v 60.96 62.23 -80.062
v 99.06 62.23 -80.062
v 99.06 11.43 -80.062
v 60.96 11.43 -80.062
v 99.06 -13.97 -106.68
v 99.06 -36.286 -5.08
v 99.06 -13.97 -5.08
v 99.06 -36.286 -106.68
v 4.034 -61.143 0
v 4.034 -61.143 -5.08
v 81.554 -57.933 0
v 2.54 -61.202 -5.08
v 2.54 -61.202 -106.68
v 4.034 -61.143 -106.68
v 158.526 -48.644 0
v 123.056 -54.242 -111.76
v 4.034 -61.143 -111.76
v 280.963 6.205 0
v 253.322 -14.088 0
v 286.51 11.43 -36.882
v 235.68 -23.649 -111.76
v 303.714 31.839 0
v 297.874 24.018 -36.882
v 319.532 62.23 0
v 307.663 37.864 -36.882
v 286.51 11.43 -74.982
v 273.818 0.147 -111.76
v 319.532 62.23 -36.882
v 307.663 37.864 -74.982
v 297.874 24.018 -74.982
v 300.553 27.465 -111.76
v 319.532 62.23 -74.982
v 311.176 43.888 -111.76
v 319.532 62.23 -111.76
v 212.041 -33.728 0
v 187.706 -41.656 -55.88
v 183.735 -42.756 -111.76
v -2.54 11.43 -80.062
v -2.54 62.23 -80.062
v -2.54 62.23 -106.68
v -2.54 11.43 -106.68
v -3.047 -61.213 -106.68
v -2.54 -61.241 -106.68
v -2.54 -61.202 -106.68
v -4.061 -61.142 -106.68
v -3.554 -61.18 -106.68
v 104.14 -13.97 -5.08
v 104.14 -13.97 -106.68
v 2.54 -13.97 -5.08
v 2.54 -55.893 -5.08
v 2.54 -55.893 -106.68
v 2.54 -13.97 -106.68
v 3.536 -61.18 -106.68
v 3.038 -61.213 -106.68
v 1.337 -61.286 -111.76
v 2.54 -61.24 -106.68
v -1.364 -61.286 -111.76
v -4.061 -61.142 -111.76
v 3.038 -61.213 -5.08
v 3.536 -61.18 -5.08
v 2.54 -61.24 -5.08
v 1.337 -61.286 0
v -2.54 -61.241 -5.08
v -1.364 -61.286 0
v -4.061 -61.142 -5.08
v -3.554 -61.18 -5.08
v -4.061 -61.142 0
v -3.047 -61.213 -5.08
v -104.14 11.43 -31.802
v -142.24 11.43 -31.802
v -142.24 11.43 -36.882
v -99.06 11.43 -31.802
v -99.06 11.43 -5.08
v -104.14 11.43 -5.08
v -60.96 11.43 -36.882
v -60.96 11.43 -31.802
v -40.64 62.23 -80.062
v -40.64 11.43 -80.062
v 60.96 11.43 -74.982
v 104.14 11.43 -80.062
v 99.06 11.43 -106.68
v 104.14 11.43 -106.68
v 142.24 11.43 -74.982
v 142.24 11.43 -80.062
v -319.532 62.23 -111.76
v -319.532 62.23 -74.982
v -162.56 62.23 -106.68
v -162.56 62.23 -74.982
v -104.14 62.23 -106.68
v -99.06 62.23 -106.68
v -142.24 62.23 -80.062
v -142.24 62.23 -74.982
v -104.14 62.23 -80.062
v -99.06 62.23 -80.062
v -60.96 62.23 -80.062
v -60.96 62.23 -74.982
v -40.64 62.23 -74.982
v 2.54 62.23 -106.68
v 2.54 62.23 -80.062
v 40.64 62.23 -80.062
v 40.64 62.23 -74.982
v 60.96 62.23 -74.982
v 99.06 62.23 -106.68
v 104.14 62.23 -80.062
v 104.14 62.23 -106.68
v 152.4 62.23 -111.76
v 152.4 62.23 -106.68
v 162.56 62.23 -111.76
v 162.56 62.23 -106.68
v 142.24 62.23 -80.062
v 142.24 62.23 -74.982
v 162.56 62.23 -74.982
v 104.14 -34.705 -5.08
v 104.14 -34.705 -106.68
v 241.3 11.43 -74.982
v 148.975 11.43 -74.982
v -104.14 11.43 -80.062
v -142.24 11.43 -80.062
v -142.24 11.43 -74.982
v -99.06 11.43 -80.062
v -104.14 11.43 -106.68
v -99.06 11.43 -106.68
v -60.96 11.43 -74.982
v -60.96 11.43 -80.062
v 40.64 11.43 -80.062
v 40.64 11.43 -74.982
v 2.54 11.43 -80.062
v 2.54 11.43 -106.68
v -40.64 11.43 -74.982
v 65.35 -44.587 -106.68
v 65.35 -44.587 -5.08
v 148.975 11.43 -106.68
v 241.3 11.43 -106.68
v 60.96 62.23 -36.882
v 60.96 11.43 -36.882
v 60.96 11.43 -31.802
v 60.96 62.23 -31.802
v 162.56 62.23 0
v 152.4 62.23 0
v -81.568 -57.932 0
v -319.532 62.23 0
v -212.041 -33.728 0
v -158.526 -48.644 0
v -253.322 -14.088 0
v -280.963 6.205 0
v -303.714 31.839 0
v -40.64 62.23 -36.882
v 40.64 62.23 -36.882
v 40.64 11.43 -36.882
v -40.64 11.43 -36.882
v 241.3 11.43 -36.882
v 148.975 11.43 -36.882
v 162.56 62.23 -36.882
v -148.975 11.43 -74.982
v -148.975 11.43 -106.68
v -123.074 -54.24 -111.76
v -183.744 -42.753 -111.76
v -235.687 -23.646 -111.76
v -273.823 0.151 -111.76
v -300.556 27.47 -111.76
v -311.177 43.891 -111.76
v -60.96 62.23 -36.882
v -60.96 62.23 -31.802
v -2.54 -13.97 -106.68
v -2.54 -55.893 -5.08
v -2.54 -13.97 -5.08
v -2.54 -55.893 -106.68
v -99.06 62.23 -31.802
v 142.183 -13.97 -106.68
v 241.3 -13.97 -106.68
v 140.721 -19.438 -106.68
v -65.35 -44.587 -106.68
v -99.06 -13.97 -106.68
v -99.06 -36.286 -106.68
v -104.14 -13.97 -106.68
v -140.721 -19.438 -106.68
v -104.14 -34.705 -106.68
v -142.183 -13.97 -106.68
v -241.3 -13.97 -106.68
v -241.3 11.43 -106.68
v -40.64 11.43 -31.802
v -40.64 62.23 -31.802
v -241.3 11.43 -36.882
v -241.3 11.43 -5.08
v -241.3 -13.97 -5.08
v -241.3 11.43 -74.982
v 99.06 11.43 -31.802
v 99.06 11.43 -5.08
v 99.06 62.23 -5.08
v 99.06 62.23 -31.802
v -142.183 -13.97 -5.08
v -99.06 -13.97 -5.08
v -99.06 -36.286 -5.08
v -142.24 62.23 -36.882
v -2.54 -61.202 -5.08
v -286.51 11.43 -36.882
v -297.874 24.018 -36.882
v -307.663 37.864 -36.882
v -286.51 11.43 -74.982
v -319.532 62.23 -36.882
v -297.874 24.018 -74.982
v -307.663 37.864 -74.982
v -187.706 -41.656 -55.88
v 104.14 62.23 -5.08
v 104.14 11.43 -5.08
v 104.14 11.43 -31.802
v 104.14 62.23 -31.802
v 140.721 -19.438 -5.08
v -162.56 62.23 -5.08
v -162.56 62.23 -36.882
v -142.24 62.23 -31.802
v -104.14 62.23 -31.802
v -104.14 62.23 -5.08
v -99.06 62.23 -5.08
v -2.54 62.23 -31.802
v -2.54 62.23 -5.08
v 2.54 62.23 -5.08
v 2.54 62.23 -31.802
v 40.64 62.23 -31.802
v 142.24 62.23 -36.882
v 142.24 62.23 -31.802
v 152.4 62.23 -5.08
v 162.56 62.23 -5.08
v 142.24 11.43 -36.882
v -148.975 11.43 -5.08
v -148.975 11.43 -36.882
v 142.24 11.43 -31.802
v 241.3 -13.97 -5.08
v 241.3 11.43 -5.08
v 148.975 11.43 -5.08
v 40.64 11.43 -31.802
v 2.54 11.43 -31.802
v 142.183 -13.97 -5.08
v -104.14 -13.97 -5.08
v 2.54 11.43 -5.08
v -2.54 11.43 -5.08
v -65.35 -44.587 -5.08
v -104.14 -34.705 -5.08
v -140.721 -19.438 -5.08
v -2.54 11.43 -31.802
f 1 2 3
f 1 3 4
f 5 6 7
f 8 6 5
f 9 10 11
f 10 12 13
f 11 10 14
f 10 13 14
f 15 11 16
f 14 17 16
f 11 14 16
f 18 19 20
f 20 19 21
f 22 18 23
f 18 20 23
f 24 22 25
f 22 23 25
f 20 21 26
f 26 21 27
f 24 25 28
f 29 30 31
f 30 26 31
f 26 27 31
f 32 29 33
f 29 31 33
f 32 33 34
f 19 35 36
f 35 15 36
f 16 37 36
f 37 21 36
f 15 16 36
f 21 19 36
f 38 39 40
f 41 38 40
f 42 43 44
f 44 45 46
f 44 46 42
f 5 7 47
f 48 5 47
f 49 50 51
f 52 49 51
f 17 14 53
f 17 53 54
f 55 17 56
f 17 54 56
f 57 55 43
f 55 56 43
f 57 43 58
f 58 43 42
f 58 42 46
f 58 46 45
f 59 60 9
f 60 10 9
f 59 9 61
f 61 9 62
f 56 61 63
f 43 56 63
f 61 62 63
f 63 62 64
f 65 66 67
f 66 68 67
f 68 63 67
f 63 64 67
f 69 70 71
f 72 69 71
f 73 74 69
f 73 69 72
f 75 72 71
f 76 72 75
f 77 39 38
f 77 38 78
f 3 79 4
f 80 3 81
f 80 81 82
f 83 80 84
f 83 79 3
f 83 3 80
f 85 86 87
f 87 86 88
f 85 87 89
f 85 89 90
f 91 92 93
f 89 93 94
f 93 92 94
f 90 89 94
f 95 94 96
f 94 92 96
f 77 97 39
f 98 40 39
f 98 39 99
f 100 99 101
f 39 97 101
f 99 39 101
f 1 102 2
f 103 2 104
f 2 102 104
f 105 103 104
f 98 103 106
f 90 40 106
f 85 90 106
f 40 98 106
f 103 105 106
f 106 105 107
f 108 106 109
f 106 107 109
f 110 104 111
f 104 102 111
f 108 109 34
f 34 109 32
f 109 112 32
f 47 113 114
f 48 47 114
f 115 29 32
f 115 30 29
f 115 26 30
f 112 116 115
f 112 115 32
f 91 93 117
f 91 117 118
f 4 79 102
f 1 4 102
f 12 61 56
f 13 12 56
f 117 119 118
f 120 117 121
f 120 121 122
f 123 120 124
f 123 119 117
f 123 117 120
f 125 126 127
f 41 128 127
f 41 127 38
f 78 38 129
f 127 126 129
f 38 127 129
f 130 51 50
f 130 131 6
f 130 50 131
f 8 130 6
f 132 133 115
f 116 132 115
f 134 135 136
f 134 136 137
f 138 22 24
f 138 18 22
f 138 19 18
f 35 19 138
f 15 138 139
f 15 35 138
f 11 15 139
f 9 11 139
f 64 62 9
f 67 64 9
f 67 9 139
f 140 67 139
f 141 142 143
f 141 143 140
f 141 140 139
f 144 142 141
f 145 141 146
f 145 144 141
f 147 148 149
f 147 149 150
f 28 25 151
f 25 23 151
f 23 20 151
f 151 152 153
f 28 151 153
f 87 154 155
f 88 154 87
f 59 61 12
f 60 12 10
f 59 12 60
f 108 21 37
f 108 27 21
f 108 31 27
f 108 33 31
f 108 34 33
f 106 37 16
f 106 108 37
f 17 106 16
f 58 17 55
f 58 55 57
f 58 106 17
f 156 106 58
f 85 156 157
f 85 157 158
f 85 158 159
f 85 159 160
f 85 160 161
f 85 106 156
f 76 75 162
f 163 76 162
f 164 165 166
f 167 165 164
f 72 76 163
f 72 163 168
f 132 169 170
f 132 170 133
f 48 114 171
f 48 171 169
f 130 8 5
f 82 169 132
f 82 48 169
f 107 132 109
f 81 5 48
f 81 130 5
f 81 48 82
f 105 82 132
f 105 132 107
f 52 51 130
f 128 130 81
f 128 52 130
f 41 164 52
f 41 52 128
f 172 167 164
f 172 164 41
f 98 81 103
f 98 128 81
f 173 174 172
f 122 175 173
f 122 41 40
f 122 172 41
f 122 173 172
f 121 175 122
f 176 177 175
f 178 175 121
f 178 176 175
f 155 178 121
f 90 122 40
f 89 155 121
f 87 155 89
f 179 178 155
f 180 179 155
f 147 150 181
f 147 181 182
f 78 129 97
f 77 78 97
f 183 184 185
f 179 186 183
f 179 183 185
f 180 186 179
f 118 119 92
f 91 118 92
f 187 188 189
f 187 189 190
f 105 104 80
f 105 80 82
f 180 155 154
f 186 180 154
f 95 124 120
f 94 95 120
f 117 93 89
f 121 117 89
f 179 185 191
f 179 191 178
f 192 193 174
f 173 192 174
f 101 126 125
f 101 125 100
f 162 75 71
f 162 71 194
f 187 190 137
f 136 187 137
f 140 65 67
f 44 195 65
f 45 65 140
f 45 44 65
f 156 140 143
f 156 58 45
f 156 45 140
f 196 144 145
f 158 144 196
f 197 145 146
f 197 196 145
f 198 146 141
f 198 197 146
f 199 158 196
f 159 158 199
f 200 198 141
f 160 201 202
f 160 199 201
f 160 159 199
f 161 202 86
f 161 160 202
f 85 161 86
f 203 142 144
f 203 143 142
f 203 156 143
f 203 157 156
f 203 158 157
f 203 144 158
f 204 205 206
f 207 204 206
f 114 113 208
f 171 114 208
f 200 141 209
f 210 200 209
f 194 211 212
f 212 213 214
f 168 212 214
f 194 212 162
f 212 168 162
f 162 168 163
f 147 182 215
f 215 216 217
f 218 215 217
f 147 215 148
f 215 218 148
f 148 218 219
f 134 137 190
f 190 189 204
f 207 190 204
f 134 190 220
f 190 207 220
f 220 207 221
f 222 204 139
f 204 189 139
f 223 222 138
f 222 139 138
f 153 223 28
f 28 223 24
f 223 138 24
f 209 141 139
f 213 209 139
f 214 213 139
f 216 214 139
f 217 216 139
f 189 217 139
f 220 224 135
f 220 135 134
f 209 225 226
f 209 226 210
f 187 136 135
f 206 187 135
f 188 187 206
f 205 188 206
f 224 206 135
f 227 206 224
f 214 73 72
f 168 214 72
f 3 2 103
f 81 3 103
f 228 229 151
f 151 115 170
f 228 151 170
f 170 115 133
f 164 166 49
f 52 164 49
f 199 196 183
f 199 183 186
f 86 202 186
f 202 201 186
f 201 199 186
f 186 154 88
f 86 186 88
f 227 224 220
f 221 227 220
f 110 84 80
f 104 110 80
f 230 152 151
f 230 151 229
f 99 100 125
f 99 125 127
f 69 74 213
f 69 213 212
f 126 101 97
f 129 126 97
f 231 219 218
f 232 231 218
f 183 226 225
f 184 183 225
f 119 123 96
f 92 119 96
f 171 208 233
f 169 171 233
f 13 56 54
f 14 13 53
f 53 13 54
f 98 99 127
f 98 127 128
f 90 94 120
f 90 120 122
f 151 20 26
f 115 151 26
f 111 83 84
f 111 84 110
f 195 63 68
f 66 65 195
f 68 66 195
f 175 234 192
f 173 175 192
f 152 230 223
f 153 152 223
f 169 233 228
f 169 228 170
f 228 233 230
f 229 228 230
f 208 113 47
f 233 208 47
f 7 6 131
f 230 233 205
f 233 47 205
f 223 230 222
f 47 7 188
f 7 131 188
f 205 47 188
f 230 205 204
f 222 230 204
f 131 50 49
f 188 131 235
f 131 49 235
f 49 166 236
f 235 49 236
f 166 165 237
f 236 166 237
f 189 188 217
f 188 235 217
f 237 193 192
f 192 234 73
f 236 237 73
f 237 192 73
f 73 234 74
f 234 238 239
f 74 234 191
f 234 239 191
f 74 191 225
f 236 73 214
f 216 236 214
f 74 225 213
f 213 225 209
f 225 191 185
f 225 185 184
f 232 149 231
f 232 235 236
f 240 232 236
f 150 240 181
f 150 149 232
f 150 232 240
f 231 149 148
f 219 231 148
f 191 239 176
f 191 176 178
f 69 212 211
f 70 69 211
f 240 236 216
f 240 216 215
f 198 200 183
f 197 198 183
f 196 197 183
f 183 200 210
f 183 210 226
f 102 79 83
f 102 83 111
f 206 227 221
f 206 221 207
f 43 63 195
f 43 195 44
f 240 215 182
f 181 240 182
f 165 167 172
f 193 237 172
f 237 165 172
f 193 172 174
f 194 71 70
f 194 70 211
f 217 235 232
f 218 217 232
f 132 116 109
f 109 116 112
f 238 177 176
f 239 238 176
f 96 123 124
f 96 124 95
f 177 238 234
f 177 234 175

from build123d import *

# Parameters (mm, degrees)
BOSS_EXTRUDE1_DEPTH                 = 111.76
SKETCH5_W                           = 304.8
SKETCH5_H                           = 25.4
CUT_EXTRUDE3_DEPTH                  = 101.6
CUT_EXTRUDE4_DEPTH                  = 227.288199427
CUT_EXTRUDE4_DEPTH_BACK             = 227.288199427
SKETCH3_W                           = 96.52
SKETCH3_H                           = 101.6
SKETCH3_W_2                         = 48.26
CUT_EXTRUDE5_REACH                  = 288.663
SKETCH6_W                           = 38.1
SKETCH6_H                           = 50.8
SKETCH7_W                           = 81.28
SKETCH7_H                           = 50.8
BOSS_EXTRUDE2_DEPTH                 = 5.08
SKETCH9_W                           = 5.08
SKETCH9_H                           = 95.25
BOSS_EXTRUDE3_DEPTH                 = 10.16
SKETCH10_W                          = 5.08
SKETCH10_H                          = 95.206439839
BOSS_EXTRUDE4_DEPTH                 = 10.16
CUT_EXTRUDE7_REACH                  = 208.854
FILLET1_R                           = 50.8
BOSS_EXTRUDE5_REACH                 = 208.854
CUT_EXTRUDE8_REACH                  = 248.593
CUT_EXTRUDE8_END_RADIUS             = 126.32098656
CUT_EXTRUDE8_DIRECTION_2_REACH      = 248.593
CUT_EXTRUDE8_DIRECTION_2_END_RADIUS = 126.32098656
BOSS_EXTRUDE6_REACH                 = 248.593
CUT_EXTRUDE9_DEPTH                  = 241.3
CUT_EXTRUDE9_DEPTH_BACK             = 241.3
CUT_EXTRUDE10_REACH                 = 346.185
SKETCH16_W                          = 38.1
SKETCH16_H                          = 50.8
CUT_EXTRUDE10_DIRECTION_2_REACH     = 346.185


with BuildPart() as part:
    # Sketch1 → Boss-Extrude1 (new body)
    with BuildSketch(Plane.XY):
        Polygon((-152.4, 62.23), (-152.4, -33.02), (0, -62.23), (152.4, -32.976439839), (152.4, 62.23), align=None)
    extrude(amount=-BOSS_EXTRUDE1_DEPTH)

    # Sketch5 → Cut-Extrude3 (cut)
    with BuildSketch(Plane.XY.offset(-5.08)):
        with Locations((0, -1.27)):
            Rectangle(SKETCH5_W, SKETCH5_H)
    extrude(amount=-CUT_EXTRUDE3_DEPTH, mode=Mode.SUBTRACT)

    # Sketch3 → Cut-Extrude4 (cut, two sides: drawn at the far end of the back side and taken through both)
    with BuildSketch(Plane(origin=(0, 62.23, 0), x_dir=(1, 0, 0), z_dir=(0, 1, 0)).offset(-CUT_EXTRUDE4_DEPTH_BACK)):
        with Locations((-50.8, 55.88)):
            Rectangle(SKETCH3_W, SKETCH3_H)
        with Locations((50.8, 55.88)):
            Rectangle(SKETCH3_W, SKETCH3_H)
        with Locations((-128.27, 55.88)):
            Rectangle(SKETCH3_W_2, SKETCH3_H)
        with Locations((128.27, 55.88)):
            Rectangle(SKETCH3_W_2, SKETCH3_H)
    extrude(amount=CUT_EXTRUDE4_DEPTH + CUT_EXTRUDE4_DEPTH_BACK, mode=Mode.SUBTRACT)

    # Cut-Extrude5: up to this face of the body (flat: up to its plane)
    cut_extrude5_end = Plane(part.part.faces().sort_by_distance((104.14, 36.83, -55.88))[0])
    # Sketch6 → Cut-Extrude5 (cut, up to the picked face)
    with BuildSketch(Plane.ZY.offset(104.14), mode=Mode.PRIVATE) as cut_extrude5_sk1:
        with Locations((-55.932057734, 36.83)):
            Rectangle(SKETCH6_W, SKETCH6_H)
    cut_extrude5_tool1 = split(extrude(cut_extrude5_sk1.sketch, amount=-CUT_EXTRUDE5_REACH, mode=Mode.PRIVATE), bisect_by=cut_extrude5_end, keep=Keep.BOTH, mode=Mode.PRIVATE)
    add(cut_extrude5_tool1.solids().sort_by(Axis((-104.14, 36.83, -55.932058), (1, 0, 0)))[0], mode=Mode.SUBTRACT)

    # Sketch7 → Boss-Extrude2 (add)
    with BuildSketch(Plane(origin=(0, 0, -36.882057734), x_dir=(-1, 0, 0), z_dir=(0, 0, -1))):
        with Locations((0, 36.83)):
            Rectangle(SKETCH7_W, SKETCH7_H)
        with Locations((101.6, 36.83)):
            Rectangle(SKETCH7_W, SKETCH7_H)
        with Locations((-101.6, 36.83)):
            Rectangle(SKETCH7_W, SKETCH7_H)
    boss_extrude2 = extrude(amount=-BOSS_EXTRUDE2_DEPTH)

    # Mirror1: Boss-Extrude2 across plane
    add(boss_extrude2.mirror(Plane(origin=(0, 0, -55.932057734), x_dir=(1, 0, 0), z_dir=(0, 0, -1))))

    # Sketch9 → Boss-Extrude3 (add)
    with BuildSketch(Plane.ZY.offset(152.4)):
        with Locations((-109.22, 14.605)):
            Rectangle(SKETCH9_W, SKETCH9_H)
        with Locations((-2.54, 14.605)):
            Rectangle(SKETCH9_W, SKETCH9_H)
    extrude(amount=BOSS_EXTRUDE3_DEPTH)

    # Sketch10 → Boss-Extrude4 (add)
    with BuildSketch(Plane(origin=(152.4, 0, 0), x_dir=(0, 0, -1), z_dir=(1, 0, 0))):
        with Locations((2.54, 14.626780081)):
            Rectangle(SKETCH10_W, SKETCH10_H)
        with Locations((109.22, 14.626780081)):
            Rectangle(SKETCH10_W, SKETCH10_H)
    extrude(amount=BOSS_EXTRUDE4_DEPTH)

    # Cut-Extrude7: up to this face of the body (flat: up to its plane)
    cut_extrude7_end = Plane(part.part.faces().sort_by_distance((-0.011490312, 7.400814094, -111.76))[0])
    # Sketch11 → Cut-Extrude7 (cut, up to the picked face)
    with BuildSketch(Plane.XY, mode=Mode.PRIVATE) as cut_extrude7_sk1:
        Polygon((-162.56, -12.7), (-119.696308585, -39.288207521), (-152.4, -33.02), (-162.56, -33.02), align=None)
    cut_extrude7_tool1 = split(extrude(cut_extrude7_sk1.sketch, amount=-CUT_EXTRUDE7_REACH, mode=Mode.PRIVATE), bisect_by=cut_extrude7_end, keep=Keep.BOTH, mode=Mode.PRIVATE)
    # Sketch11 → Cut-Extrude7 (cut, up to the picked face)
    with BuildSketch(Plane.XY, mode=Mode.PRIVATE) as cut_extrude7_sk2:
        Polygon((152.4, -33.02), (162.56, -33.02), (162.56, -12.7), (119.696308585, -39.288207521), align=None)
    cut_extrude7_tool2 = split(extrude(cut_extrude7_sk2.sketch, amount=-CUT_EXTRUDE7_REACH, mode=Mode.PRIVATE), bisect_by=cut_extrude7_end, keep=Keep.BOTH, mode=Mode.PRIVATE)
    add(cut_extrude7_tool1.solids().sort_by(Axis((-148.539263, -27.801749, 0), (0, 0, -1)))[0], mode=Mode.SUBTRACT)
    add(cut_extrude7_tool2.solids().sort_by(Axis((148.539263, -27.801749, 0), (0, 0, -1)))[0], mode=Mode.SUBTRACT)

    # Fillet1
    # the kernel refuses this fillet: 50.8 mm, written as the material it takes off along each edge
    with BuildSketch(Plane(origin=(-162.56, -12.7, 70.671047804), x_dir=(0.8497897447130388, -0.5271217978613181, 0), z_dir=(0, 0, -1)), Plane(origin=(-162.56, -12.7, -36.008952196), x_dir=(0.8497897447130388, -0.5271217978613181, 0), z_dir=(0, 0, -1)), Plane(origin=(162.56, -12.7, 70.671047804), x_dir=(0, 1, 0), z_dir=(0, 0, -1))) as fillet1_piece_1:
        with BuildLine():
            CenterArc((FILLET1_R * 0.556464943335, -FILLET1_R), FILLET1_R, 90, 58.188808221)
            Line((-FILLET1_R * 0.293324801378, -FILLET1_R * 0.472878202139), (0, 0))
            Line((0, 0), (FILLET1_R * 0.556464943335, 0))
        make_face()
    extrude(amount=146.422095607, mode=Mode.SUBTRACT)
    with BuildSketch(Plane(origin=(-119.696308585, -39.288207521, -83.186546401), x_dir=(0.9821230119270369, -0.18824024395268216, 0), z_dir=(0, 0, -1)), Plane(origin=(-119.696308585, -39.288207521, 23.493453599), x_dir=(0.9821230119270369, -0.18824024395268216, 0), z_dir=(0, 0, -1))) as fillet1_piece_2:
        with BuildLine():
            CenterArc((FILLET1_R * 0.184987823618, -FILLET1_R), FILLET1_R, 90, 20.961087149)
            Line((-FILLET1_R * 0.172745995297, -FILLET1_R * 0.0661764005955), (0, 0))
            Line((0, 0), (FILLET1_R * 0.184987823618, 0))
        make_face()
    extrude(amount=52.066907199, mode=Mode.SUBTRACT)
    with BuildSketch(Plane(origin=(162.56, -12.7, -36.008952196), x_dir=(-0.8497897447130388, -0.5271217978613181, 0), z_dir=(0, 0, -1))) as fillet1_piece_3:
        with BuildLine():
            CenterArc((FILLET1_R * 0.556464943335, FILLET1_R), FILLET1_R, 211.811191779, 58.188808221)
            Line((-FILLET1_R * 0.293324801378, FILLET1_R * 0.472878202139), (0, 0))
            Line((0, 0), (FILLET1_R * 0.556464943335, 0))
        make_face()
    extrude(amount=146.422095607, mode=Mode.SUBTRACT)
    with BuildSketch(Plane(origin=(119.776180176, -39.238663434, -83.204651008), x_dir=(-0.9820710795721669, -0.18851099349363817, 0), z_dir=(0, 0, -1)), Plane(origin=(119.776180176, -39.238663434, 23.475348992), x_dir=(-0.9820710795721669, -0.18851099349363817, 0), z_dir=(0, 0, -1))) as fillet1_piece_4:
        with BuildLine():
            CenterArc((FILLET1_R * 0.184845267653, FILLET1_R), FILLET1_R, 249.054708445, 20.945291555)
            Line((-FILLET1_R * 0.172631096402, FILLET1_R * 0.0660778141933), (0, 0))
            Line((0, 0), (FILLET1_R * 0.184845267653, 0))
        make_face()
    extrude(amount=52.030697984, mode=Mode.SUBTRACT)
    with BuildSketch(Plane(origin=(0, -62.23, 24.359816254), x_dir=(-0.982123011927037, 0.1882402439526816, 0), z_dir=(0, 0, -1))) as fillet1_piece_5:
        with BuildLine():
            CenterArc((FILLET1_R * 0.191809576801, FILLET1_R), FILLET1_R, 248.283995147, 21.716004853)
            Line((-FILLET1_R * 0.178196707507, FILLET1_R * 0.0709707488072), (0, 0))
            Line((0, 0), (FILLET1_R * 0.191809576801, 0))
        make_face()
    extrude(amount=160.479632508, mode=Mode.SUBTRACT)

    # Boss-Extrude5: up to this face of the body (flat: up to its plane)
    boss_extrude5_end = Plane(part.part.faces().sort_by_distance((-0.004732582, 8.379000895, -111.76))[0])
    # Sketch12 → Boss-Extrude5 (add, up to the picked face)
    with BuildSketch(Plane.XY, mode=Mode.PRIVATE) as boss_extrude5_sk1:
        with BuildLine():
            Line((-162.56, 62.23), (-210.82, 62.23))
            ThreePointArc((-210.82, 62.23), (-185.525923559, 8.586514121), (-138.537787331, -27.60089991))
            Line((-138.537787331, -27.60089991), (-162.56, 62.23))
        make_face()
    boss_extrude5_tool1 = split(extrude(boss_extrude5_sk1.sketch, amount=-BOSS_EXTRUDE5_REACH, mode=Mode.PRIVATE), bisect_by=boss_extrude5_end, keep=Keep.BOTH, mode=Mode.PRIVATE)
    # Sketch12 → Boss-Extrude5 (add, up to the picked face)
    with BuildSketch(Plane.XY, mode=Mode.PRIVATE) as boss_extrude5_sk2:
        with BuildLine():
            Line((162.56, 62.23), (210.82, 62.23))
            ThreePointArc((210.82, 62.23), (185.525923559, 8.586514121), (138.537787331, -27.60089991))
            Line((138.537787331, -27.60089991), (162.56, 62.23))
        make_face()
    boss_extrude5_tool2 = split(extrude(boss_extrude5_sk2.sketch, amount=-BOSS_EXTRUDE5_REACH, mode=Mode.PRIVATE), bisect_by=boss_extrude5_end, keep=Keep.BOTH, mode=Mode.PRIVATE)
    add(boss_extrude5_tool1.solids().sort_by(Axis((-173.436994, 26.131053, 0), (0, 0, -1)))[0])
    add(boss_extrude5_tool2.solids().sort_by(Axis((173.436994, 26.131053, 0), (0, 0, -1)))[0])

    # Cut-Extrude8: up to this cylinder (the profile starts inside it)
    cut_extrude8_end = Plane(origin=(-87.109319049, 87.777192878, -55.90231), z_dir=(0, 0, 1)) * Cylinder(CUT_EXTRUDE8_END_RADIUS, 750.827973119, mode=Mode.PRIVATE)
    # Sketch13 → Cut-Extrude8 (cut, up to the surface)
    with BuildSketch(Plane(origin=(0, 0, 0), x_dir=(0, 0, -1), z_dir=(1, 0, 0)), mode=Mode.PRIVATE) as cut_extrude8_sk1:
        Polygon((36.882057734, 62.23), (36.882057734, 11.43), (5.08, 11.43), (5.08, -13.97), (106.68, -13.97), (106.68, 11.43), (74.982057734, 11.43), (74.982057734, 62.23), align=None)
    cut_extrude8_tool1 = extrude(cut_extrude8_sk1.sketch, amount=-CUT_EXTRUDE8_REACH, mode=Mode.PRIVATE) & cut_extrude8_end
    add(cut_extrude8_tool1.solids().sort_by_distance((0, 15.058571, -55.90231))[0], mode=Mode.SUBTRACT)

    # Cut-Extrude8 direction 2: up to this cylinder (the profile starts inside it)
    cut_extrude8_direction_2_end = Plane(origin=(87.109319049, 87.777192878, -55.90231), z_dir=(0, 0, 1)) * Cylinder(CUT_EXTRUDE8_DIRECTION_2_END_RADIUS, 750.827973119, mode=Mode.PRIVATE)
    # Sketch13 → Cut-Extrude8 direction 2 (cut, up to the surface)
    with BuildSketch(Plane(origin=(0, 0, 0), x_dir=(0, 0, -1), z_dir=(1, 0, 0)), mode=Mode.PRIVATE) as cut_extrude8_direction_2_sk1:
        Polygon((36.882057734, 62.23), (36.882057734, 11.43), (5.08, 11.43), (5.08, -13.97), (106.68, -13.97), (106.68, 11.43), (74.982057734, 11.43), (74.982057734, 62.23), align=None)
    cut_extrude8_direction_2_tool1 = extrude(cut_extrude8_direction_2_sk1.sketch, amount=CUT_EXTRUDE8_DIRECTION_2_REACH, mode=Mode.PRIVATE) & cut_extrude8_direction_2_end
    add(cut_extrude8_direction_2_tool1.solids().sort_by_distance((0, 15.058571, -55.90231))[0], mode=Mode.SUBTRACT)

    # Boss-Extrude6: up to this face of the body (flat: up to its plane)
    boss_extrude6_end = Plane(part.part.faces().sort_by_distance((-0.004136206, 11.247831231, 0))[0])
    # Sketch14 → Boss-Extrude6 (add, up to the picked face)
    with BuildSketch(Plane(origin=(0, 0, -111.76), x_dir=(-1, 0, 0), z_dir=(0, 0, -1)), mode=Mode.PRIVATE) as boss_extrude6_sk1:
        with BuildLine():
            Line((-204.363754457, 62.23), (-319.532, 62.23))
            add(Edge.make_bspline(
                [(0.000127649, -61.30395141), (-63.035732171, -58.729844517), (-184.13294652, -59.341328161), (-298.396851531, 4.939109547), (-319.532, 62.23)],
                knots=[0, 0, 0, 0, 0.522454117, 1, 1, 1, 1], degree=3))
            Line((0.000127649, -61.30395141), (0.000127649, -56.388))
            add(Edge.make_bspline(
                [(0.000127649, -56.388), (-34.292089751, -49.634065585), (-117.293617019, -40.449633361), (-194.674150599, 7.604249577), (-204.363754457, 62.23)],
                knots=[0, 0, 0, 0, 0.415909415, 1, 1, 1, 1], degree=3))
        make_face()
    boss_extrude6_tool1 = split(extrude(boss_extrude6_sk1.sketch, amount=-BOSS_EXTRUDE6_REACH, mode=Mode.PRIVATE), bisect_by=boss_extrude6_end, keep=Keep.BOTH, mode=Mode.PRIVATE)
    # Sketch14 → Boss-Extrude6 (add, up to the picked face)
    with BuildSketch(Plane(origin=(0, 0, -111.76), x_dir=(-1, 0, 0), z_dir=(0, 0, -1)), mode=Mode.PRIVATE) as boss_extrude6_sk2:
        with BuildLine():
            Line((0.000127649, -56.388), (0.000127649, -61.30395141))
            add(Edge.make_bspline(
                [(0.000127649, -61.30395141), (63.035732171, -58.729844517), (184.13294652, -59.341328161), (298.396851531, 4.939109547), (319.532, 62.23)],
                knots=[0, 0, 0, 0, 0.522454117, 1, 1, 1, 1], degree=3))
            Line((319.532, 62.23), (204.363754457, 62.23))
            add(Edge.make_bspline(
                [(0.000127649, -56.388), (34.292089751, -49.634065585), (117.293617019, -40.449633361), (194.674150599, 7.604249577), (204.363754457, 62.23)],
                knots=[0, 0, 0, 0, 0.415909415, 1, 1, 1, 1], degree=3))
        make_face()
    boss_extrude6_tool2 = split(extrude(boss_extrude6_sk2.sketch, amount=-BOSS_EXTRUDE6_REACH, mode=Mode.PRIVATE), bisect_by=boss_extrude6_end, keep=Keep.BOTH, mode=Mode.PRIVATE)
    add(boss_extrude6_tool1.solids().sort_by(Axis((202.795825, 2.026931, -111.76), (0, 0, 1)))[0])
    add(boss_extrude6_tool2.solids().sort_by(Axis((-202.795984, 2.026638, -111.76), (0, 0, 1)))[0])

    # Sketch15 → Cut-Extrude9 (cut, two sides: drawn at the far end of the back side and taken through both)
    with BuildSketch(Plane(origin=(0, 0, 0), x_dir=(0, 0, -1), z_dir=(1, 0, 0)).offset(-CUT_EXTRUDE9_DEPTH_BACK)):
        Polygon((36.882057734, 62.23), (36.882057734, 11.43), (5.08, 11.43), (5.08, -13.97), (106.68, -13.97), (106.68, 11.43), (74.982057734, 11.43), (74.982057734, 62.23), align=None)
    extrude(amount=CUT_EXTRUDE9_DEPTH + CUT_EXTRUDE9_DEPTH_BACK, mode=Mode.SUBTRACT)

    # Sketch16 → Cut-Extrude10 (cut, up to next)
    with BuildSketch(Plane(origin=(0, 0, 0), x_dir=(0, 0, -1), z_dir=(1, 0, 0)), mode=Mode.PRIVATE) as cut_extrude10_sk1:
        with Locations((55.932057734, 36.83)):
            Rectangle(SKETCH16_W, SKETCH16_H)
    cut_extrude10_tool1 = extrude(cut_extrude10_sk1.sketch, amount=-CUT_EXTRUDE10_REACH, mode=Mode.PRIVATE) & part.part
    add(cut_extrude10_tool1.solids().sort_by_distance((0, 36.83, -55.932058))[0], mode=Mode.SUBTRACT)

    # Sketch16 → Cut-Extrude10 direction 2 (cut, up to next)
    with BuildSketch(Plane(origin=(0, 0, 0), x_dir=(0, 0, -1), z_dir=(1, 0, 0)), mode=Mode.PRIVATE) as cut_extrude10_direction_2_sk1:
        with Locations((55.932057734, 36.83)):
            Rectangle(SKETCH16_W, SKETCH16_H)
    cut_extrude10_direction_2_tool1 = extrude(cut_extrude10_direction_2_sk1.sketch, amount=CUT_EXTRUDE10_DIRECTION_2_REACH, mode=Mode.PRIVATE) & part.part
    add(cut_extrude10_direction_2_tool1.solids().sort_by_distance((0, 36.83, -55.932058))[0], mode=Mode.SUBTRACT)


solid = part.part
